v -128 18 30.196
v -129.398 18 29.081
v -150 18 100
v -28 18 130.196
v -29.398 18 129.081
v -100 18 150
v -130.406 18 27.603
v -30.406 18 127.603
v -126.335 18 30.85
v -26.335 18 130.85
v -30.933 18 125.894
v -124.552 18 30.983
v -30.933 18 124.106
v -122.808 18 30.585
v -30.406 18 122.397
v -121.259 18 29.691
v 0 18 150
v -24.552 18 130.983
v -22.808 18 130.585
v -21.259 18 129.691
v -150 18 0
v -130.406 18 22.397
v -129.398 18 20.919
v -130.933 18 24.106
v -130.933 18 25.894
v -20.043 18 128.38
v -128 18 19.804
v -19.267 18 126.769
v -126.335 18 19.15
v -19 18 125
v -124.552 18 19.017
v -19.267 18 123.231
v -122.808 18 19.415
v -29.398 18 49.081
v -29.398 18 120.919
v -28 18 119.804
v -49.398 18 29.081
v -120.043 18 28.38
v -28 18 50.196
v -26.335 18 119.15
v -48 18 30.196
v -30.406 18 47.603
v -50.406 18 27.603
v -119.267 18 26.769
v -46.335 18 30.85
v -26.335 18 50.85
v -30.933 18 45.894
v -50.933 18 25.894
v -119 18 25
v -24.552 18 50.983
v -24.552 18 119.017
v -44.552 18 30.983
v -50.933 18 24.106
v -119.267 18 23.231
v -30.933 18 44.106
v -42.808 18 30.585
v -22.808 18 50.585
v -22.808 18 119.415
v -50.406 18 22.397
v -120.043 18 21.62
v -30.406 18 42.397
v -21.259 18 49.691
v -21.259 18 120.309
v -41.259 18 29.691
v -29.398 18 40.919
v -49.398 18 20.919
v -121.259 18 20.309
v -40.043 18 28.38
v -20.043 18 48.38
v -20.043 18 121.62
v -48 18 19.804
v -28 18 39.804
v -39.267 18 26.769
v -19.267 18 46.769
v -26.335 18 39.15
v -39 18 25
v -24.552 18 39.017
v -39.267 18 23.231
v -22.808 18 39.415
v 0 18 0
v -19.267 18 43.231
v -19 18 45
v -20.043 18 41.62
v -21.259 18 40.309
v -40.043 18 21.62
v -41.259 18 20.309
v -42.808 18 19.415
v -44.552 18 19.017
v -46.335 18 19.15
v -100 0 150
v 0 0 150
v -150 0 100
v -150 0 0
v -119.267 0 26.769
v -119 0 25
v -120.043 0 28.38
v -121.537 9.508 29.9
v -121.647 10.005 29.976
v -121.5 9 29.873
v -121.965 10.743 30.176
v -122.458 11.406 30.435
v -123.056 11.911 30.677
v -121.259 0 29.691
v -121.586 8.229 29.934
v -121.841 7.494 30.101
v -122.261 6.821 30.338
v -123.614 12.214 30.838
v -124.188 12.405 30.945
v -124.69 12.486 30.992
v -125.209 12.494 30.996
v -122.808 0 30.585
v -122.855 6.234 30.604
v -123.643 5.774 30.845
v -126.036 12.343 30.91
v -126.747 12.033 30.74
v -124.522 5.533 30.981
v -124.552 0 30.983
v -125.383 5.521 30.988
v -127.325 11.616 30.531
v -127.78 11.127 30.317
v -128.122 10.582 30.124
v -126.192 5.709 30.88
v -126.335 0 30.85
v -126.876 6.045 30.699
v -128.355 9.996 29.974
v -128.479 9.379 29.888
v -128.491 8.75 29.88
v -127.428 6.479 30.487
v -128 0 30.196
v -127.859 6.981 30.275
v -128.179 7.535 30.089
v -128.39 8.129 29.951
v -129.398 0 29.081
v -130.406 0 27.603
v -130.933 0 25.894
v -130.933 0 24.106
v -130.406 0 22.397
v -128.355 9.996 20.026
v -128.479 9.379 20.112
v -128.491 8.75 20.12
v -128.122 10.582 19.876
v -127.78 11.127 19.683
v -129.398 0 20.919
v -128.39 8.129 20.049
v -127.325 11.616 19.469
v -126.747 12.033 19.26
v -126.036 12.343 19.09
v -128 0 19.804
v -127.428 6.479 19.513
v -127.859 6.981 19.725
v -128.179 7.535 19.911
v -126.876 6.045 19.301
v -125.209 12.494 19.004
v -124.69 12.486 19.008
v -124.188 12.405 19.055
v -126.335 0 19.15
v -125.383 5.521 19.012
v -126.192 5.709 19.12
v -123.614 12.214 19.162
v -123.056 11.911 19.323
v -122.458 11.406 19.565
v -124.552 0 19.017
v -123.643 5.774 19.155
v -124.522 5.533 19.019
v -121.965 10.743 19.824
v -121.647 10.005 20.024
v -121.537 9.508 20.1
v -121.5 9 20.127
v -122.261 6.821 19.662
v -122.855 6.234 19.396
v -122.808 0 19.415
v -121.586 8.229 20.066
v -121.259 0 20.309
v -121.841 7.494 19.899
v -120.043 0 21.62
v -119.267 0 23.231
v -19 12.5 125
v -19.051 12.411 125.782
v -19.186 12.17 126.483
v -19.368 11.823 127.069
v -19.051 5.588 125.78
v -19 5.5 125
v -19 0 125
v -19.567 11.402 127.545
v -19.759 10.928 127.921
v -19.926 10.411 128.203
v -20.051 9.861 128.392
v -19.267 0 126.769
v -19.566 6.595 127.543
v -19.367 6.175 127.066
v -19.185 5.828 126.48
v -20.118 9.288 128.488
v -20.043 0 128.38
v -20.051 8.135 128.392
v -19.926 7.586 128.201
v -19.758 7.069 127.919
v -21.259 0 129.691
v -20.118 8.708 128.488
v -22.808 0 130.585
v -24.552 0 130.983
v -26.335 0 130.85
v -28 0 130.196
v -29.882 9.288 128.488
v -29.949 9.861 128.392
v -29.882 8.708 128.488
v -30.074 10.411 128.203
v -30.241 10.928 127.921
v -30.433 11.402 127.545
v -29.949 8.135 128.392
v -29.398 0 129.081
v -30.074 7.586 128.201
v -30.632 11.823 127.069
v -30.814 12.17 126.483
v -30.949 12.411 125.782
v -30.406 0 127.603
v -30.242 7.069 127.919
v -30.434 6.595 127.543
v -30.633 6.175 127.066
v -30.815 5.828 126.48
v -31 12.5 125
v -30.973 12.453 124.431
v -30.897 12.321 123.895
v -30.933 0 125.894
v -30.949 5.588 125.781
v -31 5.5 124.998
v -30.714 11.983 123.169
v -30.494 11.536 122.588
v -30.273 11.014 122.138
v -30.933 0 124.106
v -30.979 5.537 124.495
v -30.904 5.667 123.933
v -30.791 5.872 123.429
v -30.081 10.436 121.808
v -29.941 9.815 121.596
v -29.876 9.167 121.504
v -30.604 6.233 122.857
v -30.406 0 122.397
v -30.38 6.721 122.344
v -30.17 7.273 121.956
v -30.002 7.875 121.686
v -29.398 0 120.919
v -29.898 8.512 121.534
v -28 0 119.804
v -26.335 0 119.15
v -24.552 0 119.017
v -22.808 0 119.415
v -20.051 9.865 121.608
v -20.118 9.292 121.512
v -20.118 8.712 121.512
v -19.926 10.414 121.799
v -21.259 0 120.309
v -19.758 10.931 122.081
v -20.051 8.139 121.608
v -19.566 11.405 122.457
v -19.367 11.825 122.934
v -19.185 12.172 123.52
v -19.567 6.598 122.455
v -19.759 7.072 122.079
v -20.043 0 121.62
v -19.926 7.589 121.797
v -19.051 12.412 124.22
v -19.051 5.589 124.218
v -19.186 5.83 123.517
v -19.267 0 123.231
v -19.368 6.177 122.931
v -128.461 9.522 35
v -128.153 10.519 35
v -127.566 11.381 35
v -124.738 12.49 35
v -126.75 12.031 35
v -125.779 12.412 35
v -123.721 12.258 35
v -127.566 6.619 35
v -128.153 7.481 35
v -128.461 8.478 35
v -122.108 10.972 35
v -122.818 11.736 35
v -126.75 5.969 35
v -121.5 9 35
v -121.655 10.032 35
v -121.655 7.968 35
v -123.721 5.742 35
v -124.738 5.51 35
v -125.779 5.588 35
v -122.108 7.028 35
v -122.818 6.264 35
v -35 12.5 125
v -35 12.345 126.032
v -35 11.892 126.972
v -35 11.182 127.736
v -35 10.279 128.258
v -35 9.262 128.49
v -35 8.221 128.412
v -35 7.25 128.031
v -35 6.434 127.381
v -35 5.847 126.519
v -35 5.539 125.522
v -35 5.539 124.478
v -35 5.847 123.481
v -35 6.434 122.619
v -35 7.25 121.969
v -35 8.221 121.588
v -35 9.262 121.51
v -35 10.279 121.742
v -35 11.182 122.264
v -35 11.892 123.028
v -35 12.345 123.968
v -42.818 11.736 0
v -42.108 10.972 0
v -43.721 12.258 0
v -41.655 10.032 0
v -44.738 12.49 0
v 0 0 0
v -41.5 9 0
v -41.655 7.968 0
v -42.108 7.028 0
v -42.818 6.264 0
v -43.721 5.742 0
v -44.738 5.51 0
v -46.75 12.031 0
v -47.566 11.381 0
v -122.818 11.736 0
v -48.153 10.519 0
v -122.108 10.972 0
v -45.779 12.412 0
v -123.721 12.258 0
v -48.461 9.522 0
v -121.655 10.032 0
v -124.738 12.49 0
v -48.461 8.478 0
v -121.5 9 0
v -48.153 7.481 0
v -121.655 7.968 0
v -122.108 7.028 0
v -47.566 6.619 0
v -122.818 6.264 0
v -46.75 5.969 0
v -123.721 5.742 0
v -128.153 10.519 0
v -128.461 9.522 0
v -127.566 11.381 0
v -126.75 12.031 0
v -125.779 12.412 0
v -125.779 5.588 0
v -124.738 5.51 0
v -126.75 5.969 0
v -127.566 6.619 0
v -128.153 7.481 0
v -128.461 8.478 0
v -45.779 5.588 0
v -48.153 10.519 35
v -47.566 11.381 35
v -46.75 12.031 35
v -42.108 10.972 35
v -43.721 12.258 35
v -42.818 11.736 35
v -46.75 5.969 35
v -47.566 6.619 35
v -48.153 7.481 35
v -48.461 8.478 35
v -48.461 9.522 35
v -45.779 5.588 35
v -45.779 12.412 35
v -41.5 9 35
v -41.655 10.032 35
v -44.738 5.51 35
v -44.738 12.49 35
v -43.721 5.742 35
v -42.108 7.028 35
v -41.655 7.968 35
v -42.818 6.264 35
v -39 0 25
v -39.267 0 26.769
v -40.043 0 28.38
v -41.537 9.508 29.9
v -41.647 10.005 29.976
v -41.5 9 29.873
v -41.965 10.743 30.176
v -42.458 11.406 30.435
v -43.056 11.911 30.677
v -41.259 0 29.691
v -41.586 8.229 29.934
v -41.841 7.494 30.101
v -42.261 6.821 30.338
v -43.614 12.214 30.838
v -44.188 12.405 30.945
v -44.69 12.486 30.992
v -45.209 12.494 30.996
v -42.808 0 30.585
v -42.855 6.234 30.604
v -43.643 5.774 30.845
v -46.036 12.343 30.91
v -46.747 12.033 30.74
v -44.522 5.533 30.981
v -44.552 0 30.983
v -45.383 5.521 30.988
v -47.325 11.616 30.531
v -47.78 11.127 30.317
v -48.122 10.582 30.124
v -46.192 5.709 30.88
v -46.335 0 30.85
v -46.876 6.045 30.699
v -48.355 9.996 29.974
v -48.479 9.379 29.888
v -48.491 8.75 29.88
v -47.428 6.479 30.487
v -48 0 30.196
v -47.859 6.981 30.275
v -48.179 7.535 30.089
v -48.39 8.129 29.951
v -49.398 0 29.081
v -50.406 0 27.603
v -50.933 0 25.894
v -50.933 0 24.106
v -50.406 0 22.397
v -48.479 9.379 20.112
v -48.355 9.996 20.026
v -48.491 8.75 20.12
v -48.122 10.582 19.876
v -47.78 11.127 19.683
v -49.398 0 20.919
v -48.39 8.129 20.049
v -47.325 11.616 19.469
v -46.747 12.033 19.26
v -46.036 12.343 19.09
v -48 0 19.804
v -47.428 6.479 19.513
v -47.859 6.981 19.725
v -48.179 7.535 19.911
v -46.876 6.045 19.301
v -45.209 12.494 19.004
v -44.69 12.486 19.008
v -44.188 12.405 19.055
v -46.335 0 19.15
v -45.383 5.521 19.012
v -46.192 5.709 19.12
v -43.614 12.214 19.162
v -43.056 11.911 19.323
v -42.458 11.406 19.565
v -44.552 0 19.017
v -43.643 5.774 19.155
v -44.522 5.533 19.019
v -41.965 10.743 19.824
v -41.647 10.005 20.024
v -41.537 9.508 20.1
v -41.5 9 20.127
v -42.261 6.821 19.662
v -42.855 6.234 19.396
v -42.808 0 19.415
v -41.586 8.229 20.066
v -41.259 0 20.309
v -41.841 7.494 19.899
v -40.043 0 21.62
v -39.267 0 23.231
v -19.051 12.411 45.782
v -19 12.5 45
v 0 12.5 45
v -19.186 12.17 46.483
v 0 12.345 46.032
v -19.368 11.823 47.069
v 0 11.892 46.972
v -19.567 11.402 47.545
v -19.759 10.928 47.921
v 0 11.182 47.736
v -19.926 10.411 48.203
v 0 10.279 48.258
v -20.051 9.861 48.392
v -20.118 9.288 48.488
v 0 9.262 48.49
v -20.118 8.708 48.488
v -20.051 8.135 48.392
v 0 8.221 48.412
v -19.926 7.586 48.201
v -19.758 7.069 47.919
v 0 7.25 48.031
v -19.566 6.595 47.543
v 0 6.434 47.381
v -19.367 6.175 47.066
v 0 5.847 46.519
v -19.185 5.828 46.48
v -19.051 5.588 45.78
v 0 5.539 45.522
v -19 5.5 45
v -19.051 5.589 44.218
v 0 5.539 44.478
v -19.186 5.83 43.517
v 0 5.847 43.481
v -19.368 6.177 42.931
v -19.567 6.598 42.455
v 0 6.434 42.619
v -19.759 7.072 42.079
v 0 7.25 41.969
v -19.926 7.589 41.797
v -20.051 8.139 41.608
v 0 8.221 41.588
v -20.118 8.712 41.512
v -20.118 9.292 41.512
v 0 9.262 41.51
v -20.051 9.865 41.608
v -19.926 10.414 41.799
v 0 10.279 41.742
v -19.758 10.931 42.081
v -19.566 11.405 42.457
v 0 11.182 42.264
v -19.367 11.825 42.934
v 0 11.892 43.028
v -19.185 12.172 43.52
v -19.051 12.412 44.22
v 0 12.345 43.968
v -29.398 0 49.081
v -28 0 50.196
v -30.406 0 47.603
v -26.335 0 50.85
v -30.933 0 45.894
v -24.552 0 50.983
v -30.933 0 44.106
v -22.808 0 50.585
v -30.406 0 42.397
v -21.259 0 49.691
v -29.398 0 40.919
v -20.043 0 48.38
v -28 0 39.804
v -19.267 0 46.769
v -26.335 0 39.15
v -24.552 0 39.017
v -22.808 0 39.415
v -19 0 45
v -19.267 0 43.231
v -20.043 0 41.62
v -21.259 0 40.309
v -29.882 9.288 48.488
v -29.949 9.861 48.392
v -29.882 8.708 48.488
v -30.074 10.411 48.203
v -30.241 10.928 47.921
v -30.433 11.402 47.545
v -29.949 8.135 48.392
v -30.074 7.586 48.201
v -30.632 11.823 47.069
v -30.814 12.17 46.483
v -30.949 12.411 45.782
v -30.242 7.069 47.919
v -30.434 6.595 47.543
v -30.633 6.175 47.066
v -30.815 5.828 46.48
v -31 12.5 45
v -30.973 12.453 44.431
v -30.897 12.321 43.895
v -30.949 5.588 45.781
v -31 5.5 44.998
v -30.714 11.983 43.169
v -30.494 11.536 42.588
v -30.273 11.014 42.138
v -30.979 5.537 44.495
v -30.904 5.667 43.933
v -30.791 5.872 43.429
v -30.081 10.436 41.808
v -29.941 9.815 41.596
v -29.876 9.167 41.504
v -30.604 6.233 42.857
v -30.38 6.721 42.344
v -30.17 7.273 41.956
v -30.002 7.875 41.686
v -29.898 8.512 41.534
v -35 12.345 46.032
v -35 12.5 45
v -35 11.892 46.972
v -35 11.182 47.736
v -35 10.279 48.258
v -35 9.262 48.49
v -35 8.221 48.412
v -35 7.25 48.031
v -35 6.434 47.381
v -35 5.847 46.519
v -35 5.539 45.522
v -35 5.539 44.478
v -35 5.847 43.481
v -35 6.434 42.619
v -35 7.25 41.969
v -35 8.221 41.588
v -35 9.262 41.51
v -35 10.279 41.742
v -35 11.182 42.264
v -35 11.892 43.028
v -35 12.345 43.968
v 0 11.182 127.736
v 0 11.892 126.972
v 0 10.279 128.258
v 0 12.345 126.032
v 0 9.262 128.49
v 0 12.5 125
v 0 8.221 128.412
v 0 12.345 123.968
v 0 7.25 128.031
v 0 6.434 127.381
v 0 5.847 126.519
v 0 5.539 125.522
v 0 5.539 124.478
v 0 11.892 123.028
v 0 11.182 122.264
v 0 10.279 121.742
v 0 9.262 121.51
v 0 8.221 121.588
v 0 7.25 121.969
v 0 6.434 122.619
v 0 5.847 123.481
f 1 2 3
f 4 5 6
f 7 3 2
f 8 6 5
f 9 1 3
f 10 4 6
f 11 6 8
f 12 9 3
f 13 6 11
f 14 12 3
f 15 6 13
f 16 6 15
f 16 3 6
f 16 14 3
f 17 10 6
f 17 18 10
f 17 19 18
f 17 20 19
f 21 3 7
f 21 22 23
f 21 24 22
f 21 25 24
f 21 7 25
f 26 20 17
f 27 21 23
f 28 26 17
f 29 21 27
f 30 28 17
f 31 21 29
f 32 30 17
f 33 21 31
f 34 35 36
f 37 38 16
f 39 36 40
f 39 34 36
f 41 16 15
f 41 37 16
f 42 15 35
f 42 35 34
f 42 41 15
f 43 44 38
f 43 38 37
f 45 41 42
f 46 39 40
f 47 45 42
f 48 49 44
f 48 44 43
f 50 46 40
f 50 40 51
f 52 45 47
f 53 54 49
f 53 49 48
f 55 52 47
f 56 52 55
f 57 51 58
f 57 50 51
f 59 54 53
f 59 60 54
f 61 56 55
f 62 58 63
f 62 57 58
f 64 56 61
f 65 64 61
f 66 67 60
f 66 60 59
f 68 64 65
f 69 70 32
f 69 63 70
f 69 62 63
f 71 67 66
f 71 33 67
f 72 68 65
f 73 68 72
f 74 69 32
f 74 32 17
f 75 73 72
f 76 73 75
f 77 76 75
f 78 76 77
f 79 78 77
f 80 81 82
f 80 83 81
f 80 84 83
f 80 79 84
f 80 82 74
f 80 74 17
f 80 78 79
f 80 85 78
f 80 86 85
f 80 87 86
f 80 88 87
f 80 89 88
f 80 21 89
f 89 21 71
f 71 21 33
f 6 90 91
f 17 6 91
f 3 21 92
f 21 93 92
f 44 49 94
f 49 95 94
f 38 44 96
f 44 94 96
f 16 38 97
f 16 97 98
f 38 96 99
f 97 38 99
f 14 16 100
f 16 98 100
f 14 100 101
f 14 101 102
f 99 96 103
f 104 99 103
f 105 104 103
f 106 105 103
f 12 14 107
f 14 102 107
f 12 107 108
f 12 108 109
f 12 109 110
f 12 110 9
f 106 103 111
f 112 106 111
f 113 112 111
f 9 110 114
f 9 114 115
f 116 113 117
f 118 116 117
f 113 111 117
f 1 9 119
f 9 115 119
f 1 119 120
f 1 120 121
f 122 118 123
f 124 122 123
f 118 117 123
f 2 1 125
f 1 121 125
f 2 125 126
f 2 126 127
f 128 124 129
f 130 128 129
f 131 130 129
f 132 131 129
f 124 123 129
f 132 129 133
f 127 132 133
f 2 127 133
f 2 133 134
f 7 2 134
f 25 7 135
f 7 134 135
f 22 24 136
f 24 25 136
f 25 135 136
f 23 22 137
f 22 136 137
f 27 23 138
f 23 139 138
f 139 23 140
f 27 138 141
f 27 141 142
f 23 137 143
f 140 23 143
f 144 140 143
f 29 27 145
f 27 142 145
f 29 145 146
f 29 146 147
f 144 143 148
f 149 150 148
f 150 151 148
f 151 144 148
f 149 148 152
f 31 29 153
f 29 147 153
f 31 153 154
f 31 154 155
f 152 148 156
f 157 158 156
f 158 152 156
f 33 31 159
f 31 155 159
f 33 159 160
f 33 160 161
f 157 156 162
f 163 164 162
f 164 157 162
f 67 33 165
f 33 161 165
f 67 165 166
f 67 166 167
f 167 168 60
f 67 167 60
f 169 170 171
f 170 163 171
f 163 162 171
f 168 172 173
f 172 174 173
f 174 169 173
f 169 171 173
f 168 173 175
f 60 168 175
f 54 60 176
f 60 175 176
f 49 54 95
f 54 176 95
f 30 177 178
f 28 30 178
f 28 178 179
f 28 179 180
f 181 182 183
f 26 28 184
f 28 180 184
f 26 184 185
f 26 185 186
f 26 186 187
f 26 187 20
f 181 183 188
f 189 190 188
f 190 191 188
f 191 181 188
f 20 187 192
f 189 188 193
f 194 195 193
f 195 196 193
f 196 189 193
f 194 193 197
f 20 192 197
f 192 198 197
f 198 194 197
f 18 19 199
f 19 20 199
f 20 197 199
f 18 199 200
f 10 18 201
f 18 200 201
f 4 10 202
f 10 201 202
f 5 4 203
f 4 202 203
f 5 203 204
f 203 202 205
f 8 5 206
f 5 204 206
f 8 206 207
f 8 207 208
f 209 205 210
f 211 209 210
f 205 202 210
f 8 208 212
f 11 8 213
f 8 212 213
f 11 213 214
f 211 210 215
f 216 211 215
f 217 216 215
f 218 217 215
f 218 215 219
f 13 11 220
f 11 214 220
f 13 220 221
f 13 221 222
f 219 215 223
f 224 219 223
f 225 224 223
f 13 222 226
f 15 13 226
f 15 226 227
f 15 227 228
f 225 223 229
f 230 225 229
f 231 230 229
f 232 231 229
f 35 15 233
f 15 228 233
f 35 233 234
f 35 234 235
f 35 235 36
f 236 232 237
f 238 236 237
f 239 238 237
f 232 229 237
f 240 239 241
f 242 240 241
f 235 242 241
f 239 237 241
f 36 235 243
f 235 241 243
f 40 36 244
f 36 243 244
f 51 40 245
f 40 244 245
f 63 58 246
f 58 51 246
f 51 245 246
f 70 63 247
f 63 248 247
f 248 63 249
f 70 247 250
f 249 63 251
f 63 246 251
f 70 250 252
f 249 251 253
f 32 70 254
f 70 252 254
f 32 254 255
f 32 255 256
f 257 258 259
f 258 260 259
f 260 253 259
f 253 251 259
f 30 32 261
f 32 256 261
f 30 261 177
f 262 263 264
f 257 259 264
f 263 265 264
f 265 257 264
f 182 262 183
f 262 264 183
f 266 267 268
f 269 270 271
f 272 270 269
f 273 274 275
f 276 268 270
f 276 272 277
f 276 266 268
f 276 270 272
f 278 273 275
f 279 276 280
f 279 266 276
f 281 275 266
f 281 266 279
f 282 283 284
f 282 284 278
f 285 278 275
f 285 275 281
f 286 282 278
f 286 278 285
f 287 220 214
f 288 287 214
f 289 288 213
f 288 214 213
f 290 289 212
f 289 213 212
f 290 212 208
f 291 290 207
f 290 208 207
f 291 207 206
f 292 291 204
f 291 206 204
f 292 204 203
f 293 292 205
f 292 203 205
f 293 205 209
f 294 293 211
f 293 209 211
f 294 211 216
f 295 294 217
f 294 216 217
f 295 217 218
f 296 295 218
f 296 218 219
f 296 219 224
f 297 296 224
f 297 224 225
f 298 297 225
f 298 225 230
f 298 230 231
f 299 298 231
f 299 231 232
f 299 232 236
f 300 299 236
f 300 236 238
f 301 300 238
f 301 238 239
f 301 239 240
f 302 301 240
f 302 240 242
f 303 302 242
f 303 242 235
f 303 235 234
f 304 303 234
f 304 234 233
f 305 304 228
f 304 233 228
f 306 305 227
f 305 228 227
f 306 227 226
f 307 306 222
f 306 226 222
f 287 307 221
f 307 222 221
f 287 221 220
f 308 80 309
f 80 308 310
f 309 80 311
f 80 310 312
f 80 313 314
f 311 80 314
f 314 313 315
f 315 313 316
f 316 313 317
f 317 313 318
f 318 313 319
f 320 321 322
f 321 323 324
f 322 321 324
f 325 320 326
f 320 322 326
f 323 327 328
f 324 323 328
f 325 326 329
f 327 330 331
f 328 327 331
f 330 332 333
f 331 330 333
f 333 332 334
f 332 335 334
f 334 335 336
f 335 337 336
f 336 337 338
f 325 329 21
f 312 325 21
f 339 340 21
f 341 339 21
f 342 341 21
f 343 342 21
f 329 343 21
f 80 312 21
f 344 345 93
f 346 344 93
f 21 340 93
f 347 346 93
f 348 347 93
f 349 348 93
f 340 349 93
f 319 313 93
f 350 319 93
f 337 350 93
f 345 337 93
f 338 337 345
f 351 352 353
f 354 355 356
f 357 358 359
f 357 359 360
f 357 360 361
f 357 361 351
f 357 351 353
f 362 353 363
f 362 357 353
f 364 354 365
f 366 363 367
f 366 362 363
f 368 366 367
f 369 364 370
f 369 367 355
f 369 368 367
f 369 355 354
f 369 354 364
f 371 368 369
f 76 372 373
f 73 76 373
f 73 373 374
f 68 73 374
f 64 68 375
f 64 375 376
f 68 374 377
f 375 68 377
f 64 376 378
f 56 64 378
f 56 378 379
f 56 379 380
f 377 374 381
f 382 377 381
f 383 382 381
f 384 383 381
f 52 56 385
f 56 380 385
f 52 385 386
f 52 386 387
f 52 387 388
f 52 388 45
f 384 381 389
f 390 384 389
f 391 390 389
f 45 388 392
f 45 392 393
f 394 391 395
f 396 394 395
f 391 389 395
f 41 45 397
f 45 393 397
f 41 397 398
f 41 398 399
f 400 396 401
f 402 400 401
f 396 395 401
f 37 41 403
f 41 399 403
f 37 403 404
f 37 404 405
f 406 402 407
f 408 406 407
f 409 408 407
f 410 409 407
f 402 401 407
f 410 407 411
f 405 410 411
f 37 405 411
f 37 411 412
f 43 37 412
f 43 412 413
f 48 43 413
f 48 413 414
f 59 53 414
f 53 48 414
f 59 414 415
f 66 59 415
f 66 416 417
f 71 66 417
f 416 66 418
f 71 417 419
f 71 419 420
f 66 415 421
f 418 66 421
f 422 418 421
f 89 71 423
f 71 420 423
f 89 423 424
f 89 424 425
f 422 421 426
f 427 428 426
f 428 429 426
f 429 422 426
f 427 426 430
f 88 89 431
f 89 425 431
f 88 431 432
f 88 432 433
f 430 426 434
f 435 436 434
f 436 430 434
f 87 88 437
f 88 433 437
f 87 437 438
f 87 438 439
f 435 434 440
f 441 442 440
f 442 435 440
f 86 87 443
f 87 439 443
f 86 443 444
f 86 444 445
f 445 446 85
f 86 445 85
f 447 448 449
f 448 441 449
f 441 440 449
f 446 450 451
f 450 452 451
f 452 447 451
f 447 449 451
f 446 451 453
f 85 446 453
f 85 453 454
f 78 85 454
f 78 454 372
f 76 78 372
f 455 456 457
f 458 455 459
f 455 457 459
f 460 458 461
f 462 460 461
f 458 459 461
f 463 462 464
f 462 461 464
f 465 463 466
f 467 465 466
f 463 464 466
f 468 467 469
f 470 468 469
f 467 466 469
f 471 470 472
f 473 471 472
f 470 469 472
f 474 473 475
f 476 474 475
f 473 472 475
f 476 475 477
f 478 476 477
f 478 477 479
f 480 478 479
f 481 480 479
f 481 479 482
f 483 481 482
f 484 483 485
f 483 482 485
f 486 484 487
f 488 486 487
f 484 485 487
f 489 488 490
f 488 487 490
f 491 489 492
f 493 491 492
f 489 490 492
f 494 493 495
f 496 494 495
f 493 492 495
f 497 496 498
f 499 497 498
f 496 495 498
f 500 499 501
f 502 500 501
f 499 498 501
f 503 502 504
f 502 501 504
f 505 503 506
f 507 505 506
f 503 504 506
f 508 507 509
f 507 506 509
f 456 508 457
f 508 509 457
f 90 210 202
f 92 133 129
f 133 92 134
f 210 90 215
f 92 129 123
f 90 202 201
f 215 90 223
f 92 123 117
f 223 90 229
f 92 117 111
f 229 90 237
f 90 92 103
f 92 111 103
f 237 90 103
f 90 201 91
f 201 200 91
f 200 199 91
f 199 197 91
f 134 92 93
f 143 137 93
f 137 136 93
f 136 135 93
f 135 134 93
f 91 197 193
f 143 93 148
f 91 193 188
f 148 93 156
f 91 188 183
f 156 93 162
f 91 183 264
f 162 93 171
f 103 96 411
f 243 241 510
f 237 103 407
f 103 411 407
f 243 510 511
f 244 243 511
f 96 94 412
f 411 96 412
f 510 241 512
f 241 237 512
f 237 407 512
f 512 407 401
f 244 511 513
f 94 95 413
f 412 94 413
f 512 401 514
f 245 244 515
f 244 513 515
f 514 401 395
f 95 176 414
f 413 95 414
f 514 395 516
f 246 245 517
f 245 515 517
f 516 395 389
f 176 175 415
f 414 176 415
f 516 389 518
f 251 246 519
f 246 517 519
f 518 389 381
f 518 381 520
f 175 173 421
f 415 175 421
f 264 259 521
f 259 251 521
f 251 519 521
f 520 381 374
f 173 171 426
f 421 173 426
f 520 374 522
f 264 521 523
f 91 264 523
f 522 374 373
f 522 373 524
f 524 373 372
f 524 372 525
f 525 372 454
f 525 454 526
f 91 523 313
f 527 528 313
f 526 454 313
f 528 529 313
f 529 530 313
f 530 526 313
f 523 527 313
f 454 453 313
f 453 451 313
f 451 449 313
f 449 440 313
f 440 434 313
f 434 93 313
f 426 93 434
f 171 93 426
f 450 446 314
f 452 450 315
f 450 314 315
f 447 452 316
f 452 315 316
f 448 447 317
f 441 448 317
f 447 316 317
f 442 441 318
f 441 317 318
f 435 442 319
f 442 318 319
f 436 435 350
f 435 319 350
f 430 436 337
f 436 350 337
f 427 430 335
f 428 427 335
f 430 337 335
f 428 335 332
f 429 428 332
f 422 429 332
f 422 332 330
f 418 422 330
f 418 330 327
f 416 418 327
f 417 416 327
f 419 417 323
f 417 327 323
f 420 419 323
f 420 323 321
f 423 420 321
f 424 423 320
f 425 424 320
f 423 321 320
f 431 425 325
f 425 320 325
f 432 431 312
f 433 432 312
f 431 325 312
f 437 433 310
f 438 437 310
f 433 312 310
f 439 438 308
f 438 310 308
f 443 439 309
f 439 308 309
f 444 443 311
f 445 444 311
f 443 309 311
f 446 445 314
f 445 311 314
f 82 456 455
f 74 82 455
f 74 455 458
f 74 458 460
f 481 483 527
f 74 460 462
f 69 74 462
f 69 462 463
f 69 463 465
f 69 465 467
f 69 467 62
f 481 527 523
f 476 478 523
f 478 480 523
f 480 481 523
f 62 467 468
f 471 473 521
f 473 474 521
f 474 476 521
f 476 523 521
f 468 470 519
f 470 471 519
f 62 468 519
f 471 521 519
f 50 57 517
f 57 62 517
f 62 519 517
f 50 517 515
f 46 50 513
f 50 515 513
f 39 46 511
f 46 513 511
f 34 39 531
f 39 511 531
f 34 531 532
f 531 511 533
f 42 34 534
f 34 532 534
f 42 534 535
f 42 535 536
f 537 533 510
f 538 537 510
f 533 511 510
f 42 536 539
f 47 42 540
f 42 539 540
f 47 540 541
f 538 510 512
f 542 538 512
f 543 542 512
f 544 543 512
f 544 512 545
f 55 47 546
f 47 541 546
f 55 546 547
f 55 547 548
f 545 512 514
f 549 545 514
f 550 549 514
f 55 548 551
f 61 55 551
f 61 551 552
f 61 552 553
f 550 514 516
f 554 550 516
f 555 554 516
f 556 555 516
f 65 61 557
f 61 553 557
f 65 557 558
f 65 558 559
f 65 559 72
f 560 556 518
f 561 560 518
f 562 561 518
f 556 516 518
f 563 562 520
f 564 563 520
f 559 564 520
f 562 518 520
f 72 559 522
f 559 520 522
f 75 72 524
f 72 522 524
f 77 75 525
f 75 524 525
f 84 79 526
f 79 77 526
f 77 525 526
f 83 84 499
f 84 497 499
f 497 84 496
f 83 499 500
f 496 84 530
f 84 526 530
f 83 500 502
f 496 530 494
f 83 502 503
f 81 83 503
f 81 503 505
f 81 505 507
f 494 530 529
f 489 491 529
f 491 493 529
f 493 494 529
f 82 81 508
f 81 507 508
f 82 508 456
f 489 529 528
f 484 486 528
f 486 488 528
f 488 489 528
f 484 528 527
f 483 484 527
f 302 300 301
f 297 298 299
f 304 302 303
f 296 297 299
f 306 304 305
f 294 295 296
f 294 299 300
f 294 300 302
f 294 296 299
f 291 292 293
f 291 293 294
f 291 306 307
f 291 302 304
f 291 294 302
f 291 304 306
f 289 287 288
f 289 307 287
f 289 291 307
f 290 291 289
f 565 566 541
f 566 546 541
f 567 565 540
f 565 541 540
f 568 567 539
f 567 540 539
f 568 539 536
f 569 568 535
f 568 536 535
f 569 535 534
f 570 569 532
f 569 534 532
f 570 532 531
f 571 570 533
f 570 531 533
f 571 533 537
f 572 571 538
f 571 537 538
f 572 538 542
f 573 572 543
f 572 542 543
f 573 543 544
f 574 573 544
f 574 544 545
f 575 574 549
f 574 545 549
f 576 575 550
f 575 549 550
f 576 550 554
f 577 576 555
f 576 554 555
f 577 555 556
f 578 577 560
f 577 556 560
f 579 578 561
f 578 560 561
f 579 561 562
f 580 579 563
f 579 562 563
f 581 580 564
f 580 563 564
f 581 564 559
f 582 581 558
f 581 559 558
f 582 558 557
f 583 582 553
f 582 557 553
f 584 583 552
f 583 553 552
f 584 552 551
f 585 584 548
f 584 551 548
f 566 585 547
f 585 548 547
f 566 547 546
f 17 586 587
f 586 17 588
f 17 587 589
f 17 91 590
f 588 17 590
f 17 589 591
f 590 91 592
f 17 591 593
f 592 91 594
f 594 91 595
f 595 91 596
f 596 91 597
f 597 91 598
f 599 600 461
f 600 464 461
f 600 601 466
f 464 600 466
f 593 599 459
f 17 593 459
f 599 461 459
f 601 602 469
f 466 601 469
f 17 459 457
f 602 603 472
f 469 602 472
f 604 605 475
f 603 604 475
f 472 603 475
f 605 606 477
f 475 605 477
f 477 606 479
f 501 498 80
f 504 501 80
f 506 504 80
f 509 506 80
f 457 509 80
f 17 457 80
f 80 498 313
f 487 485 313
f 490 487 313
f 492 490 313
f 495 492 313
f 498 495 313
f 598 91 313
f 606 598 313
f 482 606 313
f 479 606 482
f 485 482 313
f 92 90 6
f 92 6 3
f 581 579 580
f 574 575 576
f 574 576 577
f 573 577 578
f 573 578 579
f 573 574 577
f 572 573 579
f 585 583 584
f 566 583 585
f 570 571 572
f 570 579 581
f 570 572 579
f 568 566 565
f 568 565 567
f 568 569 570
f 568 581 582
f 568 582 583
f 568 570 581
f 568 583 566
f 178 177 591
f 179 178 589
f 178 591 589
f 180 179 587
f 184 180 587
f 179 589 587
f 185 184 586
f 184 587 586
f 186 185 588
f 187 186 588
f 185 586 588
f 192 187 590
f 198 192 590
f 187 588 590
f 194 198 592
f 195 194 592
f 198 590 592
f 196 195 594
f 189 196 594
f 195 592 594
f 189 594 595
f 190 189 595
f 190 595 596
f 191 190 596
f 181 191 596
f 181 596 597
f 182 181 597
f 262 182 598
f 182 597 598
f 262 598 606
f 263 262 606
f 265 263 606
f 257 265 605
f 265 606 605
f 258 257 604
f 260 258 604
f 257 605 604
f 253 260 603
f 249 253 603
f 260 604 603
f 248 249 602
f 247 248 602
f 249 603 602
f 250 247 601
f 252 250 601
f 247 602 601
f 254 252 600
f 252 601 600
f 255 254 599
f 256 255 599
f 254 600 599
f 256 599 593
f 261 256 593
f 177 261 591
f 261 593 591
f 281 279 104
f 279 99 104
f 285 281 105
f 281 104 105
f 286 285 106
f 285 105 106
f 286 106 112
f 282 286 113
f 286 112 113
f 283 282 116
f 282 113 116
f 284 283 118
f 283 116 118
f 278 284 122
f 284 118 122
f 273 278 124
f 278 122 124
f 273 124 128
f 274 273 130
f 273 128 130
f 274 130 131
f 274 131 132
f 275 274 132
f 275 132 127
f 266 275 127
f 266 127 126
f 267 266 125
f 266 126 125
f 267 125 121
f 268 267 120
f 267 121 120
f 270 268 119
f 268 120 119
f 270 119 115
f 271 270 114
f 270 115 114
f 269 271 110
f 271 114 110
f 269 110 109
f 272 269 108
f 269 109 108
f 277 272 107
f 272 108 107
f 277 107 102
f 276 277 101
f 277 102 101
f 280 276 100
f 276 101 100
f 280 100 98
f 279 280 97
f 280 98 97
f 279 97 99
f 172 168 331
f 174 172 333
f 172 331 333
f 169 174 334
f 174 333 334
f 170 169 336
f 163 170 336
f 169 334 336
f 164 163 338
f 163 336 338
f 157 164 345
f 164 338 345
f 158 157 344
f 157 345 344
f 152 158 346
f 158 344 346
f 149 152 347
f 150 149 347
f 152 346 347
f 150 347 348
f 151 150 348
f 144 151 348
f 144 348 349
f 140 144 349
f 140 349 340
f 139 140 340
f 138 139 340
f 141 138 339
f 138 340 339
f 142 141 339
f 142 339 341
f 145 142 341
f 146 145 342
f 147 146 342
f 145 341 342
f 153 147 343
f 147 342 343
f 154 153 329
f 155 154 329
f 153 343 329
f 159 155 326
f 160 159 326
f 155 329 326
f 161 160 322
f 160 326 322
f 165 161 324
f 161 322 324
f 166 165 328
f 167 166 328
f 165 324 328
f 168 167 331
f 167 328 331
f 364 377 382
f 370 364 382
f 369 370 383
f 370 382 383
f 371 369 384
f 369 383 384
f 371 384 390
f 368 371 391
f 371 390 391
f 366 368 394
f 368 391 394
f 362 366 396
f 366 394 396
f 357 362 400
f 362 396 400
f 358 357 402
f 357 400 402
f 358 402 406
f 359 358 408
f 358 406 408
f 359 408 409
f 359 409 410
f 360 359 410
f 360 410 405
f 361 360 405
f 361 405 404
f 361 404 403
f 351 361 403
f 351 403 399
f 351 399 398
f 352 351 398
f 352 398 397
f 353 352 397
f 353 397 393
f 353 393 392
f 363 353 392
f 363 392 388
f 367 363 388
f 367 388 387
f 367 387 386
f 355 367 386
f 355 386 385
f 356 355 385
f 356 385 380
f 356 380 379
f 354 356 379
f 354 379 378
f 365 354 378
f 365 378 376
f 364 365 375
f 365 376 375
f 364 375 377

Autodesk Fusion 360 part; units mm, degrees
sketch "Front" plane through (0, 0, 0) normal (0, 1, 0) x (1, 0, 0)
  line L0 (0, 0) -> (-150, 0)
  line L1 (-150, 0) -> (-150, -100)
  line L2 (-100, -150) -> (0, -150)
  line L3 (0, -150) -> (0, 0)
  line L4 (-100, -150) -> (-150, -100)
  line L5 (-25, 0) -> (-25, -150) construction
  line L6 (0, -25) -> (-150, -25) construction
  circle A0 centre (-45, -25) radius 6
  circle A1 centre (-125, -25) radius 6
  circle A2 centre (-25, -45) radius 6
  circle A3 centre (-25, -125) radius 6
  dimension "d1" = 150
  dimension "d2" = 150
  dimension "d3" = 50
  dimension "d4" = 50
  dimension "d5" = 25
  dimension "d6" = 25
  dimension "d7" = 12
  dimension "d8" = 12
  dimension "d9" = 12
  dimension "d10" = 12
  dimension "d11" = 45
  dimension "d12" = 80
  dimension "d13" = 45
  dimension "d14" = 80
extrude "Extrude1" add sketch "Front" along normal blind 18
sketch "Right" plane through (0, 0, 0) normal (1, 0, 0) x (0, 1, 0)
  line L0 (0, 150) -> (0, 0)
  line L1 (0, 0) -> (18, 0)
  line L2 (18, 0) -> (18, 150)
  line L3 (18, 150) -> (0, 150)
  line L4 (9, 0) -> (9, 150) construction
  circle A0 centre (9, 45) radius 3.5
  circle A1 centre (9, 125) radius 3.5
  dimension "d17" = 7
  dimension "d18" = 7
  dimension "d19" = 45
  dimension "d20" = 80
extrude "Extrude2" cut sketch "Right" against normal blind 35 contours A0 | A1
sketch "Sketch3" plane through (0, 0, 0) normal (0, 0, -1) x (1, 0, 0)
  line L0 (0, 0) -> (-150, 0)
  line L1 (-150, 0) -> (-150, -18)
  line L2 (-150, -18) -> (0, -18)
  line L3 (0, -18) -> (0, 0)
  line L4 (0, -9) -> (-150, -9) construction
  circle A0 centre (-45, -9) radius 3.5
  circle A1 centre (-125, -9) radius 3.5
  dimension "d23" = 7
  dimension "d24" = 7
  dimension "d25" = 45
  dimension "d26" = 80
extrude "Extrude3" cut sketch "Sketch3" against normal blind 35 contours A0 | A1
